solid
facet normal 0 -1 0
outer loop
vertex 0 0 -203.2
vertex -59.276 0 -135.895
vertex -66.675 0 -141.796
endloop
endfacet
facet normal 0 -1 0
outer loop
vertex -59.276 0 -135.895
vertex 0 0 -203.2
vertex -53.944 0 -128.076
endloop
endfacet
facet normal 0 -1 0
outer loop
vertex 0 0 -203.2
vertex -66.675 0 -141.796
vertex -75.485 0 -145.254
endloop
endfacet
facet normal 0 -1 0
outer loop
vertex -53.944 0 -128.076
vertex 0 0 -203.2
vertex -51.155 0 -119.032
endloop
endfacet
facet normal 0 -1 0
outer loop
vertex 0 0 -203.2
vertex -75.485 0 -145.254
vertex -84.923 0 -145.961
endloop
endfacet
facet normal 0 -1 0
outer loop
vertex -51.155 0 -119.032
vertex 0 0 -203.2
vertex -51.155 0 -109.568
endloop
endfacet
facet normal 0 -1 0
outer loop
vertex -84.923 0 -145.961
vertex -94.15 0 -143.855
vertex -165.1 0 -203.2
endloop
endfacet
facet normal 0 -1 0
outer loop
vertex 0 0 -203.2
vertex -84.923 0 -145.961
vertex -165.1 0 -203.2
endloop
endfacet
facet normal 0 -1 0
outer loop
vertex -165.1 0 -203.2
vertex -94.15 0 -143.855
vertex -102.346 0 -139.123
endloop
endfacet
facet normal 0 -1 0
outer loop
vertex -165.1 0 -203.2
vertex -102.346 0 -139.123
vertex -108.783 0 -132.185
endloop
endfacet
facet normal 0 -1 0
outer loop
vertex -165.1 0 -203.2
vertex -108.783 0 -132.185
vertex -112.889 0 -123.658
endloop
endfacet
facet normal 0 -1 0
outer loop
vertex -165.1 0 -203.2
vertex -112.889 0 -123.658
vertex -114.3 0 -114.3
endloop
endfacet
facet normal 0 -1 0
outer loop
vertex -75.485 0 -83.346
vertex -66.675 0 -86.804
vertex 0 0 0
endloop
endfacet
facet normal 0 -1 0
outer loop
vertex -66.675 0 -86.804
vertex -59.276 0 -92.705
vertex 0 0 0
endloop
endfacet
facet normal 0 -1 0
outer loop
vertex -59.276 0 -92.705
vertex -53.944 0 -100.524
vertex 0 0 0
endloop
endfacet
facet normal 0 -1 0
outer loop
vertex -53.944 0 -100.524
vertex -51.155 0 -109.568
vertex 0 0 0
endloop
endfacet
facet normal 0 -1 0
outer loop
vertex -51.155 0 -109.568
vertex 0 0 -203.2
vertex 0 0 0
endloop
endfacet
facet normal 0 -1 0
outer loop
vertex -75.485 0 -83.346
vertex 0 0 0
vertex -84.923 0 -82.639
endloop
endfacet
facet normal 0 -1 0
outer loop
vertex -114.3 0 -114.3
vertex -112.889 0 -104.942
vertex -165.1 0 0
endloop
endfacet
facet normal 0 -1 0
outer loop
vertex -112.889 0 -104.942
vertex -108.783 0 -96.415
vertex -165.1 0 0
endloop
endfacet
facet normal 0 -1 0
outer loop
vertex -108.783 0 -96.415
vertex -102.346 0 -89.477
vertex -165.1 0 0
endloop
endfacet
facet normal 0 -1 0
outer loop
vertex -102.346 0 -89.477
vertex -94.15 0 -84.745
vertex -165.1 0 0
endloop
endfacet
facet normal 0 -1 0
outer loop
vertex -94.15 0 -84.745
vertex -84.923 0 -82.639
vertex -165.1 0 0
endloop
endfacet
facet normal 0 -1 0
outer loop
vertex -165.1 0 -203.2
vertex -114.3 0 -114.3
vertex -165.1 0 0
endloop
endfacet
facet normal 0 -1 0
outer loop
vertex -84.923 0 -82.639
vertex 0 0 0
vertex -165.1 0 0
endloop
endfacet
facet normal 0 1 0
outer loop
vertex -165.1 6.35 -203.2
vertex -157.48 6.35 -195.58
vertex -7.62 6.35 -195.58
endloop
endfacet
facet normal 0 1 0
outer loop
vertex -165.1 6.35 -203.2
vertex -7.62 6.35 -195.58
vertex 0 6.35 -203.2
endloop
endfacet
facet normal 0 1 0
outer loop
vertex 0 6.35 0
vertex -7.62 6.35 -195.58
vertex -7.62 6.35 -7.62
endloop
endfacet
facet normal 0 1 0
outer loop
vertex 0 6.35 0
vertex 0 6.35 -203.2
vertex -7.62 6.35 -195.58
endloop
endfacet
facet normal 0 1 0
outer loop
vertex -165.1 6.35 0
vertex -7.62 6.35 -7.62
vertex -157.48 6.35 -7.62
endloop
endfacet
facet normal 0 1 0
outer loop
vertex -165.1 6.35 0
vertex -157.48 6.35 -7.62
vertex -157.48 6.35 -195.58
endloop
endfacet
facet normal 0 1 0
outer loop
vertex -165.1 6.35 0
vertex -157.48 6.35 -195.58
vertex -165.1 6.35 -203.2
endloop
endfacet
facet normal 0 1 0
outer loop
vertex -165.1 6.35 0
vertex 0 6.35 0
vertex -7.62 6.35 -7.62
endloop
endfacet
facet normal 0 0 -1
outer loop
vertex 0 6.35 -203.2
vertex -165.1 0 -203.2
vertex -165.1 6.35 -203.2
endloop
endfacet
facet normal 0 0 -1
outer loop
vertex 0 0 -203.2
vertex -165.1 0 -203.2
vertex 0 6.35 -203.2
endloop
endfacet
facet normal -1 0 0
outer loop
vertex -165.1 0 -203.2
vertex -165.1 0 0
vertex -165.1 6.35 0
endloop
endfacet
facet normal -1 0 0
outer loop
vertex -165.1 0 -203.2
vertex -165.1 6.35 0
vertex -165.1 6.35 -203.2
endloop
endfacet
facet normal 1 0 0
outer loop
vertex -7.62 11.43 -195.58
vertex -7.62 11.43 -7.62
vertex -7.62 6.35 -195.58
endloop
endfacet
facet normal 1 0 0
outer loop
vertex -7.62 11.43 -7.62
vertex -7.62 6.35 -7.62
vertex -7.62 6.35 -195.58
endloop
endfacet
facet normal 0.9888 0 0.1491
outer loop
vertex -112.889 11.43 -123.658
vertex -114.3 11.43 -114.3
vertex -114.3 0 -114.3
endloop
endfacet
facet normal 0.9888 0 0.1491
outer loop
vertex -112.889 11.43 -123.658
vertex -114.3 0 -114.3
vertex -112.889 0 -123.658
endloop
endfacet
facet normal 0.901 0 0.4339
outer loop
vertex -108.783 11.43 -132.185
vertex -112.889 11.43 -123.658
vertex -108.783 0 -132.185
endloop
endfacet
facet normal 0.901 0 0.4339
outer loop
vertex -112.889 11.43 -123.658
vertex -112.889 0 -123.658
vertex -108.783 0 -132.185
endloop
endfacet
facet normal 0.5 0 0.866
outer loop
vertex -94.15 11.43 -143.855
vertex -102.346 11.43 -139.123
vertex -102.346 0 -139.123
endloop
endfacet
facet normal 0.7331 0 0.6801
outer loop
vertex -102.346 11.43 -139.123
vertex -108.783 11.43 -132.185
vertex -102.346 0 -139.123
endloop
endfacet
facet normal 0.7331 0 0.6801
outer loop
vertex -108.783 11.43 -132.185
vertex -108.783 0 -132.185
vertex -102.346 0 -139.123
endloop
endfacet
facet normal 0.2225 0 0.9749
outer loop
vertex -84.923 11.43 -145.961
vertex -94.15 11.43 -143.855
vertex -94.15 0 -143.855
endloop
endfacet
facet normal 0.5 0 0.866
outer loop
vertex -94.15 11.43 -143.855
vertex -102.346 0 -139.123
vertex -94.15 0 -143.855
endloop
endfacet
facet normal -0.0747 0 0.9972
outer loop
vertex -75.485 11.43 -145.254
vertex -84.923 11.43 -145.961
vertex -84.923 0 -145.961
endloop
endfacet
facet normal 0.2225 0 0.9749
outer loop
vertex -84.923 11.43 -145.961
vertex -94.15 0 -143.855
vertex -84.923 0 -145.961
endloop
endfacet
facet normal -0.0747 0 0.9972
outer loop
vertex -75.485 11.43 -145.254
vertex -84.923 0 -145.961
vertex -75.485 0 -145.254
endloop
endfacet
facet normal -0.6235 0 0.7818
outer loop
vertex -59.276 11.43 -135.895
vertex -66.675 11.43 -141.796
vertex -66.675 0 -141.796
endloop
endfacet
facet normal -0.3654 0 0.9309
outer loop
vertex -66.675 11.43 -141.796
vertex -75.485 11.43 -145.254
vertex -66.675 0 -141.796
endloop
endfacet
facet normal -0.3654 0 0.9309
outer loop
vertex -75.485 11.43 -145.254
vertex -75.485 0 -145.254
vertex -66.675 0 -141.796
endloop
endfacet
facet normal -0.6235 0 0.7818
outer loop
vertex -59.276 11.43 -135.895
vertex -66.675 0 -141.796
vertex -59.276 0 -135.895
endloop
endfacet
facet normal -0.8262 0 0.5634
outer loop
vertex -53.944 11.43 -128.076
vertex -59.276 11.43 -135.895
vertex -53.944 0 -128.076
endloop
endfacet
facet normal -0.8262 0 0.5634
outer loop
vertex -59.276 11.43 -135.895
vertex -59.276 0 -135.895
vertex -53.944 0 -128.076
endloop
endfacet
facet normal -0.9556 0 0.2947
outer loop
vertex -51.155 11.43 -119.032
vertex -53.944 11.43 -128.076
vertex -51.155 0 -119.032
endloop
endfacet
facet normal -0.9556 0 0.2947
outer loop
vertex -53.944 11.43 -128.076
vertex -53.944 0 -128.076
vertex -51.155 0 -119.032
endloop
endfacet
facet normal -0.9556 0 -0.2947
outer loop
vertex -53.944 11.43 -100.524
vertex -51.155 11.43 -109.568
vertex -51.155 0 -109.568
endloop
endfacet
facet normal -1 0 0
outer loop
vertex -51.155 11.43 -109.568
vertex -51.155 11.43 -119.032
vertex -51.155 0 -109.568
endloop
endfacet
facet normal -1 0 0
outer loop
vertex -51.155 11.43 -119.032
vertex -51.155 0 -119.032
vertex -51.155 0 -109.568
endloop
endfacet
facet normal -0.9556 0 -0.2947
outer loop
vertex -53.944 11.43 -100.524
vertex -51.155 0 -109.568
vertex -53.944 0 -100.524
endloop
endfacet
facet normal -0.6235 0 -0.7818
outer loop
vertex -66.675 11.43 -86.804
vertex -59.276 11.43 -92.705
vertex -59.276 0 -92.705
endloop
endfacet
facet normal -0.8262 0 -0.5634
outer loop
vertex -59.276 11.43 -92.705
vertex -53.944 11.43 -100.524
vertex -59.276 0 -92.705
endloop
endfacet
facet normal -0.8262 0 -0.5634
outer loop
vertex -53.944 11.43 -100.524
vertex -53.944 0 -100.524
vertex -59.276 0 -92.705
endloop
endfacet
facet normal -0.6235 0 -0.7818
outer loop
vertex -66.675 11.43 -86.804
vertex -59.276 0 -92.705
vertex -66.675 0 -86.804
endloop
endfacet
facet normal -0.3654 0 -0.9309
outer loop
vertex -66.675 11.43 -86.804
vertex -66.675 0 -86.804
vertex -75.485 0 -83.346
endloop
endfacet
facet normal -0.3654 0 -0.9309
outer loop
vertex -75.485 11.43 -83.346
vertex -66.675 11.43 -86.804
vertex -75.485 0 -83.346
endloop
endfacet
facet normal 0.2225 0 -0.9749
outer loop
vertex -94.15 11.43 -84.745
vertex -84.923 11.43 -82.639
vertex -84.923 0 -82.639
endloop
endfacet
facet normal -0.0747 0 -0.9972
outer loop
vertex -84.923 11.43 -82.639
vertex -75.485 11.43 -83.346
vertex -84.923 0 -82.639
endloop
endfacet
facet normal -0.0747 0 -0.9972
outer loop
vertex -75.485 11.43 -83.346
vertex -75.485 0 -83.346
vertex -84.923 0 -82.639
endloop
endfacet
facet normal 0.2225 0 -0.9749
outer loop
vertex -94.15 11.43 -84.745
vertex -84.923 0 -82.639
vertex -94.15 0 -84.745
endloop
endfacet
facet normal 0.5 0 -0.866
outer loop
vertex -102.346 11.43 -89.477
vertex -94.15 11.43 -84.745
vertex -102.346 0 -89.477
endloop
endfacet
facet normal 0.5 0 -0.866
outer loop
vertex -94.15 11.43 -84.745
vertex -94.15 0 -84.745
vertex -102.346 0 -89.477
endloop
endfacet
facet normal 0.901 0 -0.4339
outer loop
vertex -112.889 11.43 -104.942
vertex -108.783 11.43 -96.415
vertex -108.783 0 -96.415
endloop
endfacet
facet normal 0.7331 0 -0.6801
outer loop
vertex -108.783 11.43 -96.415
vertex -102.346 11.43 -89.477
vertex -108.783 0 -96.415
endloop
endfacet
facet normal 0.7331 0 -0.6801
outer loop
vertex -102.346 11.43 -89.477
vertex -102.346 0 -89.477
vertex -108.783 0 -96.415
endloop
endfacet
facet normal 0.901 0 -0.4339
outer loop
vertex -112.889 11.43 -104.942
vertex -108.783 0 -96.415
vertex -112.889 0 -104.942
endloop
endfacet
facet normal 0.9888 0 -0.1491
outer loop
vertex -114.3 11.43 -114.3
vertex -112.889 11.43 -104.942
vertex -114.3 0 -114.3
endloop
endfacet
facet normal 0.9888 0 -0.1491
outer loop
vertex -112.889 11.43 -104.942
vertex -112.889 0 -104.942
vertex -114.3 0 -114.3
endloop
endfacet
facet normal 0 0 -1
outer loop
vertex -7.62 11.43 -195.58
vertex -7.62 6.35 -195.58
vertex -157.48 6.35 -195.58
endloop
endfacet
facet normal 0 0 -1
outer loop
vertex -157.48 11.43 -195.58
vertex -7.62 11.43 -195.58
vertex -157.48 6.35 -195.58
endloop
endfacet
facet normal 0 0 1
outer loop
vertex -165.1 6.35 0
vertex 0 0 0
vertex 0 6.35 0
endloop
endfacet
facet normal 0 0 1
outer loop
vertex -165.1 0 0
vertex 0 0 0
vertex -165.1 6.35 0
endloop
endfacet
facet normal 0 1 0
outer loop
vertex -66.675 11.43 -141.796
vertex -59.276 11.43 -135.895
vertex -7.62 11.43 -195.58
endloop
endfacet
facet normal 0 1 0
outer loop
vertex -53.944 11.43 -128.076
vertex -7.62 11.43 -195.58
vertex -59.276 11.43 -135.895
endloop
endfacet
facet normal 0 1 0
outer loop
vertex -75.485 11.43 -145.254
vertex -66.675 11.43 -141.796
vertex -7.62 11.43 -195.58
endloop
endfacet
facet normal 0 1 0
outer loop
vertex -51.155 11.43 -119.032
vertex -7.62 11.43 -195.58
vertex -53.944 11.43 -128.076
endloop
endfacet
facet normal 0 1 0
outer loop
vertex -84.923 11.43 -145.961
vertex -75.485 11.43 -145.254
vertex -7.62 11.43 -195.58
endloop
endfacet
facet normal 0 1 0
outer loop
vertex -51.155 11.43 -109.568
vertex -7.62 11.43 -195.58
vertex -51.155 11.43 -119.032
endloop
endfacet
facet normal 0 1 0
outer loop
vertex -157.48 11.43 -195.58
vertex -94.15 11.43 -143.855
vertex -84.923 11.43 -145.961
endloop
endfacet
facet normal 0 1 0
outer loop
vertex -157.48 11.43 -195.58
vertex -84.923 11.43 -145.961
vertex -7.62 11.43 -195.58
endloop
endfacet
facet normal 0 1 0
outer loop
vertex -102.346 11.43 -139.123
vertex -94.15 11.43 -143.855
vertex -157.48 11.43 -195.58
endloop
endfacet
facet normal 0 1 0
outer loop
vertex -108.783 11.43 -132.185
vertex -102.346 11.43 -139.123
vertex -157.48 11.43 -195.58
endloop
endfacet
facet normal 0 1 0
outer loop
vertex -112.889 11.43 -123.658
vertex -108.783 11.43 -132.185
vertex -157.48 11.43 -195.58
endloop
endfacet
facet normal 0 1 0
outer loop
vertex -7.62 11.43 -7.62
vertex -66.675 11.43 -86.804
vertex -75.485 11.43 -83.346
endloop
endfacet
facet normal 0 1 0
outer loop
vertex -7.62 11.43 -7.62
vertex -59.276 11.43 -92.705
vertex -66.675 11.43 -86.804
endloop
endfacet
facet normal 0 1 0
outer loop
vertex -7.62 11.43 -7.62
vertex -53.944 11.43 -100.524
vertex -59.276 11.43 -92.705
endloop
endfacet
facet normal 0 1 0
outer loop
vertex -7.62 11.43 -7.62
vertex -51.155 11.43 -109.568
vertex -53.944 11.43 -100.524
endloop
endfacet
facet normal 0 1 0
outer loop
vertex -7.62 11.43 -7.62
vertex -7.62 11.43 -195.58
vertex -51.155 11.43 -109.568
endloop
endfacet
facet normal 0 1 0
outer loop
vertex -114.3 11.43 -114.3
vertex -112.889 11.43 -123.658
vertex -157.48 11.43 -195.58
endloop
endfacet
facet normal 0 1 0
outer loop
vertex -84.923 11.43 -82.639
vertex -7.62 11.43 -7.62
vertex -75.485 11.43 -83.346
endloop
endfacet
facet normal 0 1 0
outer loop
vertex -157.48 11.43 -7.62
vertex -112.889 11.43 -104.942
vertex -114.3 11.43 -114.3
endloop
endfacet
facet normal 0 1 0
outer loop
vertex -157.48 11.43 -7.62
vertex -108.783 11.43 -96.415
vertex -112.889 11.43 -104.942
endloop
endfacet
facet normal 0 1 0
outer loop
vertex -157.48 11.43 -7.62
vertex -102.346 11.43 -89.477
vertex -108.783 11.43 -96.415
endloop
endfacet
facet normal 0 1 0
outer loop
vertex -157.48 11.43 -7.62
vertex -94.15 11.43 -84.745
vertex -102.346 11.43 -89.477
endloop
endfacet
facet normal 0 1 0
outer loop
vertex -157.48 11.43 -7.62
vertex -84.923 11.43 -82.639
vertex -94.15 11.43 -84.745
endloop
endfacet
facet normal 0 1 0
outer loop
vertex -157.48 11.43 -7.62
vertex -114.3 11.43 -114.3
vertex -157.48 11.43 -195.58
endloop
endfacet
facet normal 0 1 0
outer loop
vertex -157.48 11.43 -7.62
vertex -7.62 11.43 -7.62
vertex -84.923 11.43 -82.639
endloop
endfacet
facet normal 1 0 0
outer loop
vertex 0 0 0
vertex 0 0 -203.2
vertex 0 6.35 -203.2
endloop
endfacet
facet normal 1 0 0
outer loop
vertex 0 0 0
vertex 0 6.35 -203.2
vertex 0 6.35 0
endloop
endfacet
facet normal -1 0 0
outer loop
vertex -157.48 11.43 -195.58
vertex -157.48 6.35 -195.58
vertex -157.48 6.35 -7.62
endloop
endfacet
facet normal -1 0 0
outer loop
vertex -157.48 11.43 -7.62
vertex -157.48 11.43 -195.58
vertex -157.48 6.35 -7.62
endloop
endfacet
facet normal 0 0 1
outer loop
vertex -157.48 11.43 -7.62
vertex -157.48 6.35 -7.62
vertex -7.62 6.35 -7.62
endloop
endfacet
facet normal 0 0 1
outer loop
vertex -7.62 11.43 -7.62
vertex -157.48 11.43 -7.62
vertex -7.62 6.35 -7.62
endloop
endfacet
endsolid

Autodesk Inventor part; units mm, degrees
ref_plane "YZ Plane" through (0, 0, 0) normal (1, 0, 0) x (0, 1, 0)
ref_plane "XZ Plane" through (0, 0, 0) normal (0, 1, 0) x (-1, 0, 0)
ref_plane "XY Plane" through (0, 0, 0) normal (0, 0, 1) x (1, 0, 0)
sketch "Sketch1" plane through (0, 0, 0) normal (0, 1, 0) x (-1, 0, 0)
  line L0 (0, 0) -> (165.1, 0)
  line L1 (165.1, 0) -> (165.1, -203.2)
  line L2 (165.1, -203.2) -> (0, -203.2)
  line L3 (0, -203.2) -> (0, 0)
  line L4 (157.48, -195.58) -> (157.48, -7.62)
  line L5 (157.48, -7.62) -> (7.62, -7.62)
  line L6 (7.62, -7.62) -> (7.62, -195.58)
  line L7 (7.62, -195.58) -> (157.48, -195.58)
  circle A0 centre (82.55, -114.3) radius 31.75
  point P0 (82.55, -195.58)
  point P1 (157.48, -114.3)
  dimension "d0" = 203.2
  dimension "d1" = 165.1
  dimension "d2" = 7.62
  dimension "d3" = 63.5
  dimension "d4" = 88.9
extrude "Extrusion1" add sketch "Sketch1" along normal blind 6.35 contours L0 L1 L2 L3 | L7 L6 L5 L4 | A0
extrude "Extrusion2" add sketch "Sketch1" along normal blind 11.43 contours L7 L6 L5 L4
extrude "Extrusion3" cut sketch "Sketch1" along normal through all contours A0
properties part number "OGRobotRoof" material "ABS Plastic"
